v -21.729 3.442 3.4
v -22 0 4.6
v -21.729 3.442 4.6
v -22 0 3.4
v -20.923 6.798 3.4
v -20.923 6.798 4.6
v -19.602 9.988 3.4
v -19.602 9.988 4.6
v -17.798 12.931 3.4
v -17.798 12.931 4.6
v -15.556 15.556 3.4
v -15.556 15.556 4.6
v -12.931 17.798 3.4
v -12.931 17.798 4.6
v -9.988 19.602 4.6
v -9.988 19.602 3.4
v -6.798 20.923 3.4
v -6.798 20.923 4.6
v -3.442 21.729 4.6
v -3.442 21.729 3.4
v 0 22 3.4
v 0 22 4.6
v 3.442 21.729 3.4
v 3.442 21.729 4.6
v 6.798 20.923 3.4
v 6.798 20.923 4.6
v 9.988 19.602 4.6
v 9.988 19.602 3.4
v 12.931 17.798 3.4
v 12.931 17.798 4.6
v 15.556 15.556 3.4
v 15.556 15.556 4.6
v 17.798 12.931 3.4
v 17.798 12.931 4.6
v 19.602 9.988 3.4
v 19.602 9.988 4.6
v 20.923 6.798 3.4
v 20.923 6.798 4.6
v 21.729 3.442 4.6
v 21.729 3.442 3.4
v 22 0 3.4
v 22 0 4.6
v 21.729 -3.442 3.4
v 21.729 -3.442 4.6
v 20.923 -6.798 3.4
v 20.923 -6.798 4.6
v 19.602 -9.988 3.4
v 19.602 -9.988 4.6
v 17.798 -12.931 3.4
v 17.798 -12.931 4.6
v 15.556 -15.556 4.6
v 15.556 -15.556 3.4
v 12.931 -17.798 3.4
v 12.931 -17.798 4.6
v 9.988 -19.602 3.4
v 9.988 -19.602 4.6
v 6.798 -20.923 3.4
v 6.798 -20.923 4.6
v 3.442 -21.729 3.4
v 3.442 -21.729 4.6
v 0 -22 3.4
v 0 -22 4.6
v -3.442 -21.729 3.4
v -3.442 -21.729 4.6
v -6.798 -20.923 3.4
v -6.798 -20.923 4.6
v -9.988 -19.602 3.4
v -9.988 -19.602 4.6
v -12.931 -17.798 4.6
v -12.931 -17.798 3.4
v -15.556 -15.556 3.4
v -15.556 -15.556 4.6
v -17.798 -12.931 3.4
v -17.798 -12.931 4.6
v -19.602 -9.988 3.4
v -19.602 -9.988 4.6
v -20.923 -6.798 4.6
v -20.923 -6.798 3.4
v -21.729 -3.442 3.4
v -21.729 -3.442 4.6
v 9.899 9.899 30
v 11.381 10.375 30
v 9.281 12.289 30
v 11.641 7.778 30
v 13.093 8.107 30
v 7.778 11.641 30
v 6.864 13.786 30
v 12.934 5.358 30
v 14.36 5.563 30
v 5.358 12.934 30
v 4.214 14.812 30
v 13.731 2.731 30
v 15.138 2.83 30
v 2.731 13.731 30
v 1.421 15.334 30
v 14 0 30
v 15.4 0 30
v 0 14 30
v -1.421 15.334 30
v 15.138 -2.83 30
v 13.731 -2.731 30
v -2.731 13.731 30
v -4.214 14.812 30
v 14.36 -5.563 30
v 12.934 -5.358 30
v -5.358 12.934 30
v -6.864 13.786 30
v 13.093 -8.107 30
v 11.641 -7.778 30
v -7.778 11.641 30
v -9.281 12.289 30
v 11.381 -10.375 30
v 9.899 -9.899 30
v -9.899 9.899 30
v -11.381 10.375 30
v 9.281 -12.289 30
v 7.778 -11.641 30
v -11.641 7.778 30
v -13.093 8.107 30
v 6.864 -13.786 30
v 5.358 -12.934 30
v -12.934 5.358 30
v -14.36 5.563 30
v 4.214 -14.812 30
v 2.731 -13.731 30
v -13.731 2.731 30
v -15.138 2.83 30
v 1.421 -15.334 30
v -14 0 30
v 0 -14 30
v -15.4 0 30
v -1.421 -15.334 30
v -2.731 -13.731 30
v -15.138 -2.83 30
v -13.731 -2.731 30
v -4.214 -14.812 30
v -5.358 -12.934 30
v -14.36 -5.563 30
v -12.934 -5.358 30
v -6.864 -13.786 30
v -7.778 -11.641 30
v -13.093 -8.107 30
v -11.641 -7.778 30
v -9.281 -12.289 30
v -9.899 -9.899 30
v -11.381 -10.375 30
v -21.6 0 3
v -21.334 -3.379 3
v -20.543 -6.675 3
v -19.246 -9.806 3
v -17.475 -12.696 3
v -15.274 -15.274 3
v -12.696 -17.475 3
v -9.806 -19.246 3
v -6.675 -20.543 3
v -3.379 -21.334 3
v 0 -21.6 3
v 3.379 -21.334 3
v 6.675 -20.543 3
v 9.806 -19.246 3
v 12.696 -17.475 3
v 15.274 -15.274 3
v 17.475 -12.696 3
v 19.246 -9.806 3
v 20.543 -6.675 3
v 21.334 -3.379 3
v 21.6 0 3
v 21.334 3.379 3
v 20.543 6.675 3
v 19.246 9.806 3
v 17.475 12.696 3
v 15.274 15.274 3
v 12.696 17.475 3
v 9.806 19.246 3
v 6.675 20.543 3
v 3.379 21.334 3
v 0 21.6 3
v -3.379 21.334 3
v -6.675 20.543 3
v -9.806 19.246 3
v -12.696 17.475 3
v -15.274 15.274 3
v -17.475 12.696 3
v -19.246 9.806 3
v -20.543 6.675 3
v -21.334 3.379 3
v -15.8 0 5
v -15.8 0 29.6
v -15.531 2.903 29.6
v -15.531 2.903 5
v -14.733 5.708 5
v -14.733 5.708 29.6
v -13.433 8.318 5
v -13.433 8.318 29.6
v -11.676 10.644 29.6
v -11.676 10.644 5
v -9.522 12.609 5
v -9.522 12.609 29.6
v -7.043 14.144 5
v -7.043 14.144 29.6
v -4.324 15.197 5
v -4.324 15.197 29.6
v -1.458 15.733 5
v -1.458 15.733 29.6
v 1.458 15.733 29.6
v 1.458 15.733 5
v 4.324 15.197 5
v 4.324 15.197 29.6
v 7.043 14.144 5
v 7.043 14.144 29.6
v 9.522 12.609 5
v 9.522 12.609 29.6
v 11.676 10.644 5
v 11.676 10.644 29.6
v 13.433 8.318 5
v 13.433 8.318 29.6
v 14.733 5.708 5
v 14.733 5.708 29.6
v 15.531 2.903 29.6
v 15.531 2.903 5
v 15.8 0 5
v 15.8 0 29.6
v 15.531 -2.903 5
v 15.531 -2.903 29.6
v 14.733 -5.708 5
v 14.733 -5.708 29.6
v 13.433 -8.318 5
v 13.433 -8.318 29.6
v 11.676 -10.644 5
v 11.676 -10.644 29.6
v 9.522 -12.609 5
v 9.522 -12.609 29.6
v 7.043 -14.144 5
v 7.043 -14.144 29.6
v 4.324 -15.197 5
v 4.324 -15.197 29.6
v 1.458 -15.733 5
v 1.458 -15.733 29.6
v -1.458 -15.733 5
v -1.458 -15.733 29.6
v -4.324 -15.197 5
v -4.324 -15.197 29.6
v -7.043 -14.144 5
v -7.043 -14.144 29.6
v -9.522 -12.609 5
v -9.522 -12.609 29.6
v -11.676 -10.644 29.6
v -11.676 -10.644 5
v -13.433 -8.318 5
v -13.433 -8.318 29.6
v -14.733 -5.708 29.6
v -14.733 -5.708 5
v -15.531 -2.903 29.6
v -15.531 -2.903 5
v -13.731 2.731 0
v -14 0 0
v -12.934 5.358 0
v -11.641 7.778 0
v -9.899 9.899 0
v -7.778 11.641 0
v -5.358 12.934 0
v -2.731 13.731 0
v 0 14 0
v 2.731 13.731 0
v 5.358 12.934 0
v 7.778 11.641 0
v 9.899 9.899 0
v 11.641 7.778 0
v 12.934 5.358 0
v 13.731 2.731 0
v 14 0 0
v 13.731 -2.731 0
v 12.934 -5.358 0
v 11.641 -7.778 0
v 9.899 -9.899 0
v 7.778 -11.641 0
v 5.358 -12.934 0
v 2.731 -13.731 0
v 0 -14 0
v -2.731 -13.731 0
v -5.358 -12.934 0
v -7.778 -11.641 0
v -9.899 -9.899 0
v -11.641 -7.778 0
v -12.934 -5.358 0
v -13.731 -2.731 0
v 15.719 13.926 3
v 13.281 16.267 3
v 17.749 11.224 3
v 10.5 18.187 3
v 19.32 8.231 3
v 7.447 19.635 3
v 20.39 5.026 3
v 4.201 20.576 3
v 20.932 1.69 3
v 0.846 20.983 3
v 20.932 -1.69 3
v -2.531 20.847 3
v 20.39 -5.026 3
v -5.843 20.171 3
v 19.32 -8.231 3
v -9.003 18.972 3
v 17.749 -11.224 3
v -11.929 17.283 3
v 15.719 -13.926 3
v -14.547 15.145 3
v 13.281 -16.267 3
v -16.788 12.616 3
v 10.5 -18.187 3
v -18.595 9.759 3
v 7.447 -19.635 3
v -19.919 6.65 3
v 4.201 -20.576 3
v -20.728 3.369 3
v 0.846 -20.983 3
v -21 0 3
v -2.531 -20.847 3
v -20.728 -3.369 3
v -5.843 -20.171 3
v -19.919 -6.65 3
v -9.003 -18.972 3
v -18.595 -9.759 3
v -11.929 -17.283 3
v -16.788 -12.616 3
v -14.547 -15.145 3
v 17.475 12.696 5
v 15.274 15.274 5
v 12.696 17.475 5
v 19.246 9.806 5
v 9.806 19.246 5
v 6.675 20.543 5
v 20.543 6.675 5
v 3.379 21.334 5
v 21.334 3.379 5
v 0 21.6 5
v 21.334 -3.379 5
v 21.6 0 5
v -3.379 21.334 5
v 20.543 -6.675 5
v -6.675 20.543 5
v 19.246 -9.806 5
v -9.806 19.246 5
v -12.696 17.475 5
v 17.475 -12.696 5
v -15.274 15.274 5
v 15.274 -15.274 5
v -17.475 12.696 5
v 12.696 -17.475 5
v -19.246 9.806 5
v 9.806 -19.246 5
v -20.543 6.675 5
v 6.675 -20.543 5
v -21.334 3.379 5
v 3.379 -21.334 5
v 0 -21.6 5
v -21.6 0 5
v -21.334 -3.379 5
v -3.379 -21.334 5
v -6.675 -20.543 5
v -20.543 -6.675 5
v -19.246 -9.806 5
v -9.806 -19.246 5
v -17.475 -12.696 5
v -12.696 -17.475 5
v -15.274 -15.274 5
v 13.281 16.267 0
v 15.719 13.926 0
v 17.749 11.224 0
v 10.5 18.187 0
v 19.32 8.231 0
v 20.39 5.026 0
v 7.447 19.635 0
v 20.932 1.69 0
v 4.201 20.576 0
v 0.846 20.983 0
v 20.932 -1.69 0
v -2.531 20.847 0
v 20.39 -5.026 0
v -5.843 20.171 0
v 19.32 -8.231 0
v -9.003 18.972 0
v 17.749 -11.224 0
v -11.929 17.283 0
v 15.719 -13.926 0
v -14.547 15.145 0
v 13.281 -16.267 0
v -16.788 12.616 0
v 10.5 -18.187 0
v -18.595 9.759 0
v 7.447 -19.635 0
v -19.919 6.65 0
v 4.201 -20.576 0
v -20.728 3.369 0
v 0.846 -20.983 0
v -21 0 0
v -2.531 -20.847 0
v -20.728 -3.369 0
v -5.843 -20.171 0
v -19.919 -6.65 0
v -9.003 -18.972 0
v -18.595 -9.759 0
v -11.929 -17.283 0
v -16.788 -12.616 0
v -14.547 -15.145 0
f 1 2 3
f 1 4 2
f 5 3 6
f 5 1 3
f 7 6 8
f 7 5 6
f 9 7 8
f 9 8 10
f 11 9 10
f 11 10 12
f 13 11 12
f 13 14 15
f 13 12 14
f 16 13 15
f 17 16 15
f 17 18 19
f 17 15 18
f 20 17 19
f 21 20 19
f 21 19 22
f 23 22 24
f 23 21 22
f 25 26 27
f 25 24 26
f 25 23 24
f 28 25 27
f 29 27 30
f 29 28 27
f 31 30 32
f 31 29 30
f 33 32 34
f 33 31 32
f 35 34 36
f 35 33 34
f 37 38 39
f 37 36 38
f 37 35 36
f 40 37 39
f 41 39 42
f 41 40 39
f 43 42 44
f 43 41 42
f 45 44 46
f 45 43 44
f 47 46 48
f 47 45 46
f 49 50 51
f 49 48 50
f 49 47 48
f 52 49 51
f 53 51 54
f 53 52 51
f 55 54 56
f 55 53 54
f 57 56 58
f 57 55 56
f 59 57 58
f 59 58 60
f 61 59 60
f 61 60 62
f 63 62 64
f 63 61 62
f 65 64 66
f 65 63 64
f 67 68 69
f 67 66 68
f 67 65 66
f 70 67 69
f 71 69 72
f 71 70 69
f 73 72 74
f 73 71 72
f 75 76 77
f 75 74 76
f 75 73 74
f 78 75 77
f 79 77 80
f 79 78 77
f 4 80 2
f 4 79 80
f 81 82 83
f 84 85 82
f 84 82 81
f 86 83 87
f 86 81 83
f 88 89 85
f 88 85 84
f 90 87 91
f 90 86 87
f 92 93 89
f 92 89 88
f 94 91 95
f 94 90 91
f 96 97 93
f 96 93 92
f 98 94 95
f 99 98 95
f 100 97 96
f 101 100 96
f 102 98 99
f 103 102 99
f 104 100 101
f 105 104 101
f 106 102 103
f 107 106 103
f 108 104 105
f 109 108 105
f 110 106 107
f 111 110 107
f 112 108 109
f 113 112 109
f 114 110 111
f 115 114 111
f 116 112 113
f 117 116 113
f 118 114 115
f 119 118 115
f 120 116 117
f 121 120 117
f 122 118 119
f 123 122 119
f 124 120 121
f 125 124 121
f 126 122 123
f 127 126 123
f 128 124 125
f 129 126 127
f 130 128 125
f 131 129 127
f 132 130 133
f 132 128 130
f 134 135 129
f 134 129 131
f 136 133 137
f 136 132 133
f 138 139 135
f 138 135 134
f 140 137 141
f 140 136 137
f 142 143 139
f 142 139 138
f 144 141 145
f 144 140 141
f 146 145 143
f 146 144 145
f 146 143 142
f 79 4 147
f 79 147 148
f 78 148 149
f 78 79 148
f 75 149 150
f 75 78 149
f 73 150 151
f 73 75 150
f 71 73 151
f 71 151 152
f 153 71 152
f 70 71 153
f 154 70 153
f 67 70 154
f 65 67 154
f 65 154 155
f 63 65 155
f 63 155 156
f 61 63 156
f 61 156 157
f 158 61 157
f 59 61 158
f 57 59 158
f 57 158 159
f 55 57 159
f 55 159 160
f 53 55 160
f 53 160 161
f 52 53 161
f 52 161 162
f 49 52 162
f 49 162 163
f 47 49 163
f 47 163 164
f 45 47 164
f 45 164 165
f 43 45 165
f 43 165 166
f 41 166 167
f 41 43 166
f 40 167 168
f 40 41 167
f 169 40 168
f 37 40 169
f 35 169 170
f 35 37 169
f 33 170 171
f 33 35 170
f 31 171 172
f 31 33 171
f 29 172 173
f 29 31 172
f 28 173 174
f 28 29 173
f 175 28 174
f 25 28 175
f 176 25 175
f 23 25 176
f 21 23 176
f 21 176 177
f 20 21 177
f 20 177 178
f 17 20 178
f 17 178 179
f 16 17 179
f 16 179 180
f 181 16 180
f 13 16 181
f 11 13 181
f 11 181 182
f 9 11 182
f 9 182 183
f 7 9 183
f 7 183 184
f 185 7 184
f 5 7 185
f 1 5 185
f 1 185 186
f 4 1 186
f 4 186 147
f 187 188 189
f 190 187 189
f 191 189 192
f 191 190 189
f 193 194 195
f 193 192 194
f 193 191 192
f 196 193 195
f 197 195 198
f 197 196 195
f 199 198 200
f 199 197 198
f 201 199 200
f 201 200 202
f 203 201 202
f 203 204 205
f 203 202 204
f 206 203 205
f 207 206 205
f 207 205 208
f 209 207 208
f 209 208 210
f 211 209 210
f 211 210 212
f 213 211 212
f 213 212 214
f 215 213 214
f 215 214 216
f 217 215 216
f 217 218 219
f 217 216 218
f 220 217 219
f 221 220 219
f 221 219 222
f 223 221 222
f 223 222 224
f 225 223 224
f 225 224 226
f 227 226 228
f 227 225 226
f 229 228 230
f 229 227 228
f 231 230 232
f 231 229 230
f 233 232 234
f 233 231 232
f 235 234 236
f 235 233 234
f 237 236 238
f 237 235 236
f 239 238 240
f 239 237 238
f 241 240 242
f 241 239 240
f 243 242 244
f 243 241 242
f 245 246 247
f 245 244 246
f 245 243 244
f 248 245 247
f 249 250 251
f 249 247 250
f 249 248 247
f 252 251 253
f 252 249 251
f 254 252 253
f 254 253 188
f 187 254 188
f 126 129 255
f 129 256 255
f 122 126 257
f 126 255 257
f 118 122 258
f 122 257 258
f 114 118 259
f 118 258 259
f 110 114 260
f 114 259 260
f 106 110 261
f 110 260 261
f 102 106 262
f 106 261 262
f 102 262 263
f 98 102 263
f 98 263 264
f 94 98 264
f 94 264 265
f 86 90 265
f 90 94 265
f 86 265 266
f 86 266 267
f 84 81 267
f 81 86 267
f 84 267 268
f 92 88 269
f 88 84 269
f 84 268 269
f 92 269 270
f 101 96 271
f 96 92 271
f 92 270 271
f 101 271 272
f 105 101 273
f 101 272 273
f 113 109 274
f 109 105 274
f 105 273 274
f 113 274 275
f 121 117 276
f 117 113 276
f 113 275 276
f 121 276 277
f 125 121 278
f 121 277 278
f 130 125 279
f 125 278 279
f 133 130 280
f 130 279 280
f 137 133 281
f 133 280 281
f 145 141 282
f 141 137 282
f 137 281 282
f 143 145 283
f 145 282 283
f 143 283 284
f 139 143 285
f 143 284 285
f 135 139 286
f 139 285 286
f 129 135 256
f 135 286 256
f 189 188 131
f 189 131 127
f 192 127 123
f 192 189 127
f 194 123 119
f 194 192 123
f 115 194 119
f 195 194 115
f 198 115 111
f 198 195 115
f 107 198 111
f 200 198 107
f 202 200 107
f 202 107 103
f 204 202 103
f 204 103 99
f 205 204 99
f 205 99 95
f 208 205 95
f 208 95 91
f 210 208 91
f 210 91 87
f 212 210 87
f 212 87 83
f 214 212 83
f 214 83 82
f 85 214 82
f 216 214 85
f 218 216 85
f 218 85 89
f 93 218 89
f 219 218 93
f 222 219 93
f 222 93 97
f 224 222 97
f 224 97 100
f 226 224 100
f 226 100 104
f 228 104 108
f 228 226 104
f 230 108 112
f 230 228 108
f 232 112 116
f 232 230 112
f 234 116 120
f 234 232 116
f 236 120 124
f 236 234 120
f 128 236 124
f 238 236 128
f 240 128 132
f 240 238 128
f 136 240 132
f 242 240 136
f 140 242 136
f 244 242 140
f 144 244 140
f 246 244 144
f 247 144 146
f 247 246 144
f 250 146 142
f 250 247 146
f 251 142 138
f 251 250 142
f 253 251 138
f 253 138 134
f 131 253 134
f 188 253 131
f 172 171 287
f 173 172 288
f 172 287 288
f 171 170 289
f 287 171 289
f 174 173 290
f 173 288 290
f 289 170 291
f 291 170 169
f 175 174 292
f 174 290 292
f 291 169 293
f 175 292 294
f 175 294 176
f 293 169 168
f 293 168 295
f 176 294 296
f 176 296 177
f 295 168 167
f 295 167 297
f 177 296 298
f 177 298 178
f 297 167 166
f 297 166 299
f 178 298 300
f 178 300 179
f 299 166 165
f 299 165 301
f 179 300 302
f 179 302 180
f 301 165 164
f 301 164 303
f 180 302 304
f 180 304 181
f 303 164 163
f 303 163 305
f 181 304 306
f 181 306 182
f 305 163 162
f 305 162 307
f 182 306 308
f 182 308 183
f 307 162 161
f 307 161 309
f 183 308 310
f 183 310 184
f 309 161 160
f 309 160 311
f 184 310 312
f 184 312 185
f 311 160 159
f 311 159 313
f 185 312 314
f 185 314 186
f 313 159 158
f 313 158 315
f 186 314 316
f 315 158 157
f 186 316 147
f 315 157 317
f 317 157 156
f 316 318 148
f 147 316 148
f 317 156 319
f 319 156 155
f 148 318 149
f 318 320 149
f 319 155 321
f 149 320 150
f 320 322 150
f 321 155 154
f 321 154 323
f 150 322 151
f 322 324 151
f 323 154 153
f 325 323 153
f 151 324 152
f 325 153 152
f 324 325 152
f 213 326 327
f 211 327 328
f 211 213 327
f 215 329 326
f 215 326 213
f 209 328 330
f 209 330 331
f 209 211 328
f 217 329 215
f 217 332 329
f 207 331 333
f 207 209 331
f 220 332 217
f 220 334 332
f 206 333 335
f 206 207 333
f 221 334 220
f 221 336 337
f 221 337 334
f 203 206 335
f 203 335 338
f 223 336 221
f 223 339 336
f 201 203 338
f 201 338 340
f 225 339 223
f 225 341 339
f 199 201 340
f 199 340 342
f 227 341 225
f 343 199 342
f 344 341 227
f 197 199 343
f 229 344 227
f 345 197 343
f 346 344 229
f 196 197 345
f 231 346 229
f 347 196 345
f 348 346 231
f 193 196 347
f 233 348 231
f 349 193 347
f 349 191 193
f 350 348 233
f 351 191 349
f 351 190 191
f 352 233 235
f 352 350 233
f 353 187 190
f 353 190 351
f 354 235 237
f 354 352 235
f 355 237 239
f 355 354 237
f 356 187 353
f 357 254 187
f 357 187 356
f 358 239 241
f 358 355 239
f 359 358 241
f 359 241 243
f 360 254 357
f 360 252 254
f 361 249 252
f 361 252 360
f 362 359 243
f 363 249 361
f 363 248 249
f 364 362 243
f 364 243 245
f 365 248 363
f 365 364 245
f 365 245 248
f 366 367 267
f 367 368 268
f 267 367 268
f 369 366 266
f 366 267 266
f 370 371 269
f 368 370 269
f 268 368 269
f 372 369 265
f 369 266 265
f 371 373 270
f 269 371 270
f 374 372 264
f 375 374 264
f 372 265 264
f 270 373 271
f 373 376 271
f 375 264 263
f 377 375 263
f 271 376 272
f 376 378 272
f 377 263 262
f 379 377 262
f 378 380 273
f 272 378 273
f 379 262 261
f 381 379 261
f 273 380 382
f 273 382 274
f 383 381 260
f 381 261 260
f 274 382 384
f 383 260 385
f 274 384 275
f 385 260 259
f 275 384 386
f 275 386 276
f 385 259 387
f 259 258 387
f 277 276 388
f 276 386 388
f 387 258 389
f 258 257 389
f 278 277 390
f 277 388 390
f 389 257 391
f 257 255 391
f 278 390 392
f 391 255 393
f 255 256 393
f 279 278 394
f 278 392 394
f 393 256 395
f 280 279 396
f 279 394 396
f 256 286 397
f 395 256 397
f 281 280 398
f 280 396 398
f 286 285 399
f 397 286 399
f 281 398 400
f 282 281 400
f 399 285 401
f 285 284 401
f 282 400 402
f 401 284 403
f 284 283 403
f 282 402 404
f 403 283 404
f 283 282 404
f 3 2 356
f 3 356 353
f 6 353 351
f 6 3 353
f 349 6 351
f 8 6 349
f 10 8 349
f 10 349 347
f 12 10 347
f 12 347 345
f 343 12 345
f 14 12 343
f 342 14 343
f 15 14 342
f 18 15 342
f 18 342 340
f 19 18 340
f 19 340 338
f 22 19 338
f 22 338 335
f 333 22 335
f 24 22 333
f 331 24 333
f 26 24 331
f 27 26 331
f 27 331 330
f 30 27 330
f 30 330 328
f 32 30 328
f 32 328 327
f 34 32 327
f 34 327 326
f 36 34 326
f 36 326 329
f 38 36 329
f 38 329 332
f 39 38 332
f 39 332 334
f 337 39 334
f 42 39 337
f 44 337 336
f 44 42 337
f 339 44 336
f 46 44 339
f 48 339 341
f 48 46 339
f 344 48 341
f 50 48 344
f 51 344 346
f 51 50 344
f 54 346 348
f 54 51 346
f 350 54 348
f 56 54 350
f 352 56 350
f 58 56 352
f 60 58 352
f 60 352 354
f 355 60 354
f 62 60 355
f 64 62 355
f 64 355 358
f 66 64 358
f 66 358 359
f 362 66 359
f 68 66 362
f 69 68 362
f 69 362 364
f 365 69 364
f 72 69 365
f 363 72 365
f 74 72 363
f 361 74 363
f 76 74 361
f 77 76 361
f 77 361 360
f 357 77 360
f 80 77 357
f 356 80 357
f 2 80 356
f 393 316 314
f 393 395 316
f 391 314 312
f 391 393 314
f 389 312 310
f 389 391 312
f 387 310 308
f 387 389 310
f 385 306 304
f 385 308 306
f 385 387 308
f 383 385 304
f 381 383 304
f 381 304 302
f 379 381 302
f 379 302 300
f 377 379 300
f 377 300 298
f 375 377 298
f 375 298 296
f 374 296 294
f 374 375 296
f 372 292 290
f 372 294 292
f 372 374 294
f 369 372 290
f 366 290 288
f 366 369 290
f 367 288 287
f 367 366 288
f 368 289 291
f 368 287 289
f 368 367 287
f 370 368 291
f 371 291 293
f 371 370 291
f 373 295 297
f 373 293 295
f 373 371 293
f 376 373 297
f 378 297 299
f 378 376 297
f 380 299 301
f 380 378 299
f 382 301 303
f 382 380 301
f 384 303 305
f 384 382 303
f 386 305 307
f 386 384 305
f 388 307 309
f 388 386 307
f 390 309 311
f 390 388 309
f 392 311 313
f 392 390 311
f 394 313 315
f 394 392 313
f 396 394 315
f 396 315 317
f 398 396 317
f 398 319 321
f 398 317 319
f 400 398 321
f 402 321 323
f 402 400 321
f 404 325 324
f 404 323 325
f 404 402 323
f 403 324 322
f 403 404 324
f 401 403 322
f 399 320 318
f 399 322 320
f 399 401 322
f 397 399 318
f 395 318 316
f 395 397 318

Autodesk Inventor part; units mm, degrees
ref_plane "YZ Plane" through (0, 0, 0) normal (1, 0, 0) x (0, 1, 0)
ref_plane "XZ Plane" through (0, 0, 0) normal (0, 1, 0) x (-1, 0, 0)
ref_plane "XY Plane" through (0, 0, 0) normal (0, 0, 1) x (1, 0, 0)
sketch "Sketch1" plane through (0, 0, 0) normal (0, 1, 0) x (-1, 0, 0)
  line L0 (0, 0) -> (0, 30)
  line L1 (15.8, 30) -> (15.8, 5)
  line L2 (15.8, 5) -> (22, 5)
  line L3 (22, 5) -> (22, 3)
  line L4 (22, 3) -> (21, 3)
  line L5 (21, 3) -> (21, 0)
  line L6 (0, 30) -> (14, 30) construction
  line L7 (14, 30) -> (15.8, 30)
  line L8 (21, 0) -> (14, 0)
  line L9 (14, 0) -> (0, 0) construction
  line L10 (14, 30) -> (14, 0)
  dimension "d0" = 28
  dimension "d1" = 31.6
  dimension "d2" = 44
  dimension "d3" = 42
  dimension "d4" = 3
  dimension "d5" = 2
  dimension "d6" = 25
revolve "Revolution1" add sketch "Sketch1" angle 360 about axis through (0, 0, 0) along (0, 0, 1)
chamfer "Chamfer1" distance 0.4 angle 45 3 edges at (15.8, 0, 30) (22, 0, 5) (22, 0, 3)
properties part number "M42-nose-peace" material "Aluminum 6061"
